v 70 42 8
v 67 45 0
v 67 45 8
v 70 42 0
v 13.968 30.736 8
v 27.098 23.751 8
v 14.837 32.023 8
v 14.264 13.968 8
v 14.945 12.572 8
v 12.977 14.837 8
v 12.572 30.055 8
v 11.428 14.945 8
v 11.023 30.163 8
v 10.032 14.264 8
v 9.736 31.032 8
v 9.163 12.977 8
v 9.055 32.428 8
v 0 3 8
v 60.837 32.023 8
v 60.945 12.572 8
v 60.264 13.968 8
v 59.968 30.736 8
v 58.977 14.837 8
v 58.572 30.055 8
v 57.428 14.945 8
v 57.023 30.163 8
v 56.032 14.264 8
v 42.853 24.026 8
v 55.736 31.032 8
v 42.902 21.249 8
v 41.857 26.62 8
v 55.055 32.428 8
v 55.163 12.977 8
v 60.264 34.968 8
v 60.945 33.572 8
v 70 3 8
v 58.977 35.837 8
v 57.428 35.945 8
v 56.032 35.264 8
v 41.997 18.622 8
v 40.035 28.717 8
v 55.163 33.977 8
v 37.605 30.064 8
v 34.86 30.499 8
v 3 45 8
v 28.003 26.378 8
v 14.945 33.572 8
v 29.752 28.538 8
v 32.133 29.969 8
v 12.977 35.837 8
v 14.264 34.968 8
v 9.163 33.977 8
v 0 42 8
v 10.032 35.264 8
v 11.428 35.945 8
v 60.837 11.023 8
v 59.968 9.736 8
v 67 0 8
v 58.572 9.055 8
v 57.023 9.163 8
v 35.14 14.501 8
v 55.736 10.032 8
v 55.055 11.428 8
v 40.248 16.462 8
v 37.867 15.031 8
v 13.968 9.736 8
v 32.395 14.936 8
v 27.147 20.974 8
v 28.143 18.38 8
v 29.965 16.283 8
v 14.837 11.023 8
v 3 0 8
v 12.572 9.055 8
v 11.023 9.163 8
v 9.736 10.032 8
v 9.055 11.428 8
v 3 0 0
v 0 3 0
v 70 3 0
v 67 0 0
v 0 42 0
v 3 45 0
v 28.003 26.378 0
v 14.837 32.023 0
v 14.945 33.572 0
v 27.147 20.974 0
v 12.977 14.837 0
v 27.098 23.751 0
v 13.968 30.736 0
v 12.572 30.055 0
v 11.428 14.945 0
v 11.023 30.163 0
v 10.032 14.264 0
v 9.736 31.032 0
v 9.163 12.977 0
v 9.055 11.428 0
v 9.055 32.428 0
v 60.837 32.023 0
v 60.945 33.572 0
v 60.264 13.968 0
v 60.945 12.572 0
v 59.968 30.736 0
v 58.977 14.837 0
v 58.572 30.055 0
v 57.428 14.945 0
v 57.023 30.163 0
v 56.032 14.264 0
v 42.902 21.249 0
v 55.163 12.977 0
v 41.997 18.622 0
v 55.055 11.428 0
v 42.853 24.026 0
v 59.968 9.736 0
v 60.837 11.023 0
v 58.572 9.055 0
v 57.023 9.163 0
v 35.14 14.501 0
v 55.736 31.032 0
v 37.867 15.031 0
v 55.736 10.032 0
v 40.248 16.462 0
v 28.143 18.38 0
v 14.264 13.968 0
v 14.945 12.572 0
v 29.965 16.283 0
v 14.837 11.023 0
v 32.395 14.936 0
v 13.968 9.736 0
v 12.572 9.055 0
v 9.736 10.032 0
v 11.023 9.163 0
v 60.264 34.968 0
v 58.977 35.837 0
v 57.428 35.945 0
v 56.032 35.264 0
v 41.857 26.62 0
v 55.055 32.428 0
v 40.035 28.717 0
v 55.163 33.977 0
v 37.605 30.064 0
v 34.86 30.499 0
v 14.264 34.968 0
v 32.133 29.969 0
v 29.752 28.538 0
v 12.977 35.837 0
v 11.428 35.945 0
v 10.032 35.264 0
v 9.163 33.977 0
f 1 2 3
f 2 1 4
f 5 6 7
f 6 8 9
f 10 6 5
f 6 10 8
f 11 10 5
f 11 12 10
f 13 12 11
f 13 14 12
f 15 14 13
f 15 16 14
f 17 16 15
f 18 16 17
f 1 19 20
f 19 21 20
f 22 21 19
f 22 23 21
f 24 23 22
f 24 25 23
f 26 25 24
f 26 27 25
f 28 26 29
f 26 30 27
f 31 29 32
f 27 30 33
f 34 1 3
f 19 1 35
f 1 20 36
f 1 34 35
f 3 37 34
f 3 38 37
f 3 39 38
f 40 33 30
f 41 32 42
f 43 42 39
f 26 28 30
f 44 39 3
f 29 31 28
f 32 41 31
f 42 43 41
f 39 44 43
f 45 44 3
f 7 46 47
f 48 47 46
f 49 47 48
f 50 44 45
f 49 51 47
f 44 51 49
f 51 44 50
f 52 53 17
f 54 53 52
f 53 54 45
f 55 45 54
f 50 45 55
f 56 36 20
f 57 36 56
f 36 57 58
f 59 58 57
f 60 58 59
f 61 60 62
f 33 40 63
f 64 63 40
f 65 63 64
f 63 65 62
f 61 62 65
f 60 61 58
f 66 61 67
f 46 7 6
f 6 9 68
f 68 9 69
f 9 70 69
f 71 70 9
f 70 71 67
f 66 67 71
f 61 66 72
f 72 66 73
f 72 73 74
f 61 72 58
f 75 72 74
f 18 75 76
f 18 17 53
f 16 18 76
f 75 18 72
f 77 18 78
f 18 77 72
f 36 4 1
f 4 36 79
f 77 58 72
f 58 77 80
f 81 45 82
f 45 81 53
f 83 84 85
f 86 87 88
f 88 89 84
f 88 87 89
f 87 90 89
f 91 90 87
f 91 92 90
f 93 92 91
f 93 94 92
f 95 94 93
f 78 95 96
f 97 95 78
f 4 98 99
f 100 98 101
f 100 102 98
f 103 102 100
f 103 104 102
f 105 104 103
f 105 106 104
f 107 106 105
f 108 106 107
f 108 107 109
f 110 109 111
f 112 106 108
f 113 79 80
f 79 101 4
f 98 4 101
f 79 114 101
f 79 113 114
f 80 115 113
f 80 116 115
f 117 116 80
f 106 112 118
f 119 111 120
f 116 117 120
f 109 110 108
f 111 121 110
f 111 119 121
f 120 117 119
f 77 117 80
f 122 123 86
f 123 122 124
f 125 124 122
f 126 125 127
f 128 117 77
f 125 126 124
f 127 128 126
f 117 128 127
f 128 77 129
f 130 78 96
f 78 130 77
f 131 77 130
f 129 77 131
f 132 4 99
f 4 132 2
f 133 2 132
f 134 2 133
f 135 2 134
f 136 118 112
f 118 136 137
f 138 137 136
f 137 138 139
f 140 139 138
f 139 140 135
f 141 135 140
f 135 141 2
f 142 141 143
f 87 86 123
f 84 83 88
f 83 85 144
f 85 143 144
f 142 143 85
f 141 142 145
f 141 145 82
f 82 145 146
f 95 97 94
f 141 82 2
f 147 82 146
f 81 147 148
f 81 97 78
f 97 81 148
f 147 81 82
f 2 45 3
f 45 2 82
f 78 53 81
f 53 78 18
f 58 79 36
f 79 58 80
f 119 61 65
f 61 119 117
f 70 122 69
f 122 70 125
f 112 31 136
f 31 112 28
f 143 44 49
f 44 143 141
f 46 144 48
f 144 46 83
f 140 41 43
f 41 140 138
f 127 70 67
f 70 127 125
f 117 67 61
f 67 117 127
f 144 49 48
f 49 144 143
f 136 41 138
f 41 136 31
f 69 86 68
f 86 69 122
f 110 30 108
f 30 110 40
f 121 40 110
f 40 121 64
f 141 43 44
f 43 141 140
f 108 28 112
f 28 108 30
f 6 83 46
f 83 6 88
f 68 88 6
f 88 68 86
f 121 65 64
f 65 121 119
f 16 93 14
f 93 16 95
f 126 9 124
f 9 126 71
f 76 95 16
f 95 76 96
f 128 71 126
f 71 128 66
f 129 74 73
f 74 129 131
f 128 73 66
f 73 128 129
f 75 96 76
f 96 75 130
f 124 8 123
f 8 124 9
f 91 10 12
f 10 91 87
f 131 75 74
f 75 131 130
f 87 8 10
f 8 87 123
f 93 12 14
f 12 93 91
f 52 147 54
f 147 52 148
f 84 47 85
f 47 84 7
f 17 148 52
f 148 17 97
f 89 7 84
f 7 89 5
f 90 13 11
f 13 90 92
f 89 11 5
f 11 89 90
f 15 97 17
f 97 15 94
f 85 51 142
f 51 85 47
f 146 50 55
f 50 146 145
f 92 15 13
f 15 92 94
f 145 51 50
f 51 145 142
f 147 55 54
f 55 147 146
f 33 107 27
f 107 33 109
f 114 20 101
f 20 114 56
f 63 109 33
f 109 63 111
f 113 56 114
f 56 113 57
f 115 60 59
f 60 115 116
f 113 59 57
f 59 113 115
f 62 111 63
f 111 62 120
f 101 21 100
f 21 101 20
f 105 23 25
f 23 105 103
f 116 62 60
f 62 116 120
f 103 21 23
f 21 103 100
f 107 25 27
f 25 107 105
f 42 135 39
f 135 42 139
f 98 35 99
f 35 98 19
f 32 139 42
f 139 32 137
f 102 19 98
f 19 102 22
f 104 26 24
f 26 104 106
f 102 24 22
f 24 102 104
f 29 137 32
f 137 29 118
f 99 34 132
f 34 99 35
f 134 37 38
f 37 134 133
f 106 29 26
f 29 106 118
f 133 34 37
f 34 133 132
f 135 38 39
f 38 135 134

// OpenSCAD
$fn = 32;

// ----------------------------------------------------------------------
// Spacer plate: rect 70 x 45
// ----------------------------------------------------------------------

// --- parameters (mm) ---
bore_r = 8;               // centre bore radius
bolt_r = 3;               // bolt hole radius
plate_t = 8;              // plate thickness, Z (extrusion height)
plate_l = 70;             // plate length, X
plate_w = 45;             // plate width, Y
inset = 12;               // corner hole inset

profile = [[3, 0], [67, 0], [70, 3], [70, 42], [67, 45], [3, 45], [0, 42], [0, 3]];  // primary outline, 8 points, counter clockwise
void_1 = [[42.853, 24.026], [41.857, 26.62], [40.035, 28.717], [37.605, 30.064], [34.86, 30.499], [32.133, 29.969], [29.752, 28.538], [28.003, 26.378], [27.098, 23.751], [27.147, 20.974], [28.143, 18.38], [29.965, 16.283], [32.395, 14.936], [35.14, 14.501], [37.867, 15.031], [40.248, 16.462], [41.997, 18.622], [42.902, 21.249]];  // centre bore, 18 points
void_2 = [[14.945, 12.572], [14.264, 13.968], [12.977, 14.837], [11.428, 14.945], [10.032, 14.264], [9.163, 12.977], [9.055, 11.428], [9.736, 10.032], [11.023, 9.163], [12.572, 9.055], [13.968, 9.736], [14.837, 11.023]];  // corner hole, 12 points
void_3 = [[14.945, 33.572], [14.264, 34.968], [12.977, 35.837], [11.428, 35.945], [10.032, 35.264], [9.163, 33.977], [9.055, 32.428], [9.736, 31.032], [11.023, 30.163], [12.572, 30.055], [13.968, 30.736], [14.837, 32.023]];  // corner hole, 12 points
void_4 = [[60.945, 12.572], [60.264, 13.968], [58.977, 14.837], [57.428, 14.945], [56.032, 14.264], [55.163, 12.977], [55.055, 11.428], [55.736, 10.032], [57.023, 9.163], [58.572, 9.055], [59.968, 9.736], [60.837, 11.023]];  // corner hole, 12 points
void_5 = [[60.945, 33.572], [60.264, 34.968], [58.977, 35.837], [57.428, 35.945], [56.032, 35.264], [55.163, 33.977], [55.055, 32.428], [55.736, 31.032], [57.023, 30.163], [58.572, 30.055], [59.968, 30.736], [60.837, 32.023]];  // corner hole, 12 points

// --- the one profile operation ---
difference() {
  linear_extrude(height = plate_t) polygon(points = profile);
  translate([0, 0, -1])
    linear_extrude(height = plate_t + 2) polygon(points = void_1);
  translate([0, 0, -1])
    linear_extrude(height = plate_t + 2) polygon(points = void_2);
  translate([0, 0, -1])
    linear_extrude(height = plate_t + 2) polygon(points = void_3);
  translate([0, 0, -1])
    linear_extrude(height = plate_t + 2) polygon(points = void_4);
  translate([0, 0, -1])
    linear_extrude(height = plate_t + 2) polygon(points = void_5);
}
